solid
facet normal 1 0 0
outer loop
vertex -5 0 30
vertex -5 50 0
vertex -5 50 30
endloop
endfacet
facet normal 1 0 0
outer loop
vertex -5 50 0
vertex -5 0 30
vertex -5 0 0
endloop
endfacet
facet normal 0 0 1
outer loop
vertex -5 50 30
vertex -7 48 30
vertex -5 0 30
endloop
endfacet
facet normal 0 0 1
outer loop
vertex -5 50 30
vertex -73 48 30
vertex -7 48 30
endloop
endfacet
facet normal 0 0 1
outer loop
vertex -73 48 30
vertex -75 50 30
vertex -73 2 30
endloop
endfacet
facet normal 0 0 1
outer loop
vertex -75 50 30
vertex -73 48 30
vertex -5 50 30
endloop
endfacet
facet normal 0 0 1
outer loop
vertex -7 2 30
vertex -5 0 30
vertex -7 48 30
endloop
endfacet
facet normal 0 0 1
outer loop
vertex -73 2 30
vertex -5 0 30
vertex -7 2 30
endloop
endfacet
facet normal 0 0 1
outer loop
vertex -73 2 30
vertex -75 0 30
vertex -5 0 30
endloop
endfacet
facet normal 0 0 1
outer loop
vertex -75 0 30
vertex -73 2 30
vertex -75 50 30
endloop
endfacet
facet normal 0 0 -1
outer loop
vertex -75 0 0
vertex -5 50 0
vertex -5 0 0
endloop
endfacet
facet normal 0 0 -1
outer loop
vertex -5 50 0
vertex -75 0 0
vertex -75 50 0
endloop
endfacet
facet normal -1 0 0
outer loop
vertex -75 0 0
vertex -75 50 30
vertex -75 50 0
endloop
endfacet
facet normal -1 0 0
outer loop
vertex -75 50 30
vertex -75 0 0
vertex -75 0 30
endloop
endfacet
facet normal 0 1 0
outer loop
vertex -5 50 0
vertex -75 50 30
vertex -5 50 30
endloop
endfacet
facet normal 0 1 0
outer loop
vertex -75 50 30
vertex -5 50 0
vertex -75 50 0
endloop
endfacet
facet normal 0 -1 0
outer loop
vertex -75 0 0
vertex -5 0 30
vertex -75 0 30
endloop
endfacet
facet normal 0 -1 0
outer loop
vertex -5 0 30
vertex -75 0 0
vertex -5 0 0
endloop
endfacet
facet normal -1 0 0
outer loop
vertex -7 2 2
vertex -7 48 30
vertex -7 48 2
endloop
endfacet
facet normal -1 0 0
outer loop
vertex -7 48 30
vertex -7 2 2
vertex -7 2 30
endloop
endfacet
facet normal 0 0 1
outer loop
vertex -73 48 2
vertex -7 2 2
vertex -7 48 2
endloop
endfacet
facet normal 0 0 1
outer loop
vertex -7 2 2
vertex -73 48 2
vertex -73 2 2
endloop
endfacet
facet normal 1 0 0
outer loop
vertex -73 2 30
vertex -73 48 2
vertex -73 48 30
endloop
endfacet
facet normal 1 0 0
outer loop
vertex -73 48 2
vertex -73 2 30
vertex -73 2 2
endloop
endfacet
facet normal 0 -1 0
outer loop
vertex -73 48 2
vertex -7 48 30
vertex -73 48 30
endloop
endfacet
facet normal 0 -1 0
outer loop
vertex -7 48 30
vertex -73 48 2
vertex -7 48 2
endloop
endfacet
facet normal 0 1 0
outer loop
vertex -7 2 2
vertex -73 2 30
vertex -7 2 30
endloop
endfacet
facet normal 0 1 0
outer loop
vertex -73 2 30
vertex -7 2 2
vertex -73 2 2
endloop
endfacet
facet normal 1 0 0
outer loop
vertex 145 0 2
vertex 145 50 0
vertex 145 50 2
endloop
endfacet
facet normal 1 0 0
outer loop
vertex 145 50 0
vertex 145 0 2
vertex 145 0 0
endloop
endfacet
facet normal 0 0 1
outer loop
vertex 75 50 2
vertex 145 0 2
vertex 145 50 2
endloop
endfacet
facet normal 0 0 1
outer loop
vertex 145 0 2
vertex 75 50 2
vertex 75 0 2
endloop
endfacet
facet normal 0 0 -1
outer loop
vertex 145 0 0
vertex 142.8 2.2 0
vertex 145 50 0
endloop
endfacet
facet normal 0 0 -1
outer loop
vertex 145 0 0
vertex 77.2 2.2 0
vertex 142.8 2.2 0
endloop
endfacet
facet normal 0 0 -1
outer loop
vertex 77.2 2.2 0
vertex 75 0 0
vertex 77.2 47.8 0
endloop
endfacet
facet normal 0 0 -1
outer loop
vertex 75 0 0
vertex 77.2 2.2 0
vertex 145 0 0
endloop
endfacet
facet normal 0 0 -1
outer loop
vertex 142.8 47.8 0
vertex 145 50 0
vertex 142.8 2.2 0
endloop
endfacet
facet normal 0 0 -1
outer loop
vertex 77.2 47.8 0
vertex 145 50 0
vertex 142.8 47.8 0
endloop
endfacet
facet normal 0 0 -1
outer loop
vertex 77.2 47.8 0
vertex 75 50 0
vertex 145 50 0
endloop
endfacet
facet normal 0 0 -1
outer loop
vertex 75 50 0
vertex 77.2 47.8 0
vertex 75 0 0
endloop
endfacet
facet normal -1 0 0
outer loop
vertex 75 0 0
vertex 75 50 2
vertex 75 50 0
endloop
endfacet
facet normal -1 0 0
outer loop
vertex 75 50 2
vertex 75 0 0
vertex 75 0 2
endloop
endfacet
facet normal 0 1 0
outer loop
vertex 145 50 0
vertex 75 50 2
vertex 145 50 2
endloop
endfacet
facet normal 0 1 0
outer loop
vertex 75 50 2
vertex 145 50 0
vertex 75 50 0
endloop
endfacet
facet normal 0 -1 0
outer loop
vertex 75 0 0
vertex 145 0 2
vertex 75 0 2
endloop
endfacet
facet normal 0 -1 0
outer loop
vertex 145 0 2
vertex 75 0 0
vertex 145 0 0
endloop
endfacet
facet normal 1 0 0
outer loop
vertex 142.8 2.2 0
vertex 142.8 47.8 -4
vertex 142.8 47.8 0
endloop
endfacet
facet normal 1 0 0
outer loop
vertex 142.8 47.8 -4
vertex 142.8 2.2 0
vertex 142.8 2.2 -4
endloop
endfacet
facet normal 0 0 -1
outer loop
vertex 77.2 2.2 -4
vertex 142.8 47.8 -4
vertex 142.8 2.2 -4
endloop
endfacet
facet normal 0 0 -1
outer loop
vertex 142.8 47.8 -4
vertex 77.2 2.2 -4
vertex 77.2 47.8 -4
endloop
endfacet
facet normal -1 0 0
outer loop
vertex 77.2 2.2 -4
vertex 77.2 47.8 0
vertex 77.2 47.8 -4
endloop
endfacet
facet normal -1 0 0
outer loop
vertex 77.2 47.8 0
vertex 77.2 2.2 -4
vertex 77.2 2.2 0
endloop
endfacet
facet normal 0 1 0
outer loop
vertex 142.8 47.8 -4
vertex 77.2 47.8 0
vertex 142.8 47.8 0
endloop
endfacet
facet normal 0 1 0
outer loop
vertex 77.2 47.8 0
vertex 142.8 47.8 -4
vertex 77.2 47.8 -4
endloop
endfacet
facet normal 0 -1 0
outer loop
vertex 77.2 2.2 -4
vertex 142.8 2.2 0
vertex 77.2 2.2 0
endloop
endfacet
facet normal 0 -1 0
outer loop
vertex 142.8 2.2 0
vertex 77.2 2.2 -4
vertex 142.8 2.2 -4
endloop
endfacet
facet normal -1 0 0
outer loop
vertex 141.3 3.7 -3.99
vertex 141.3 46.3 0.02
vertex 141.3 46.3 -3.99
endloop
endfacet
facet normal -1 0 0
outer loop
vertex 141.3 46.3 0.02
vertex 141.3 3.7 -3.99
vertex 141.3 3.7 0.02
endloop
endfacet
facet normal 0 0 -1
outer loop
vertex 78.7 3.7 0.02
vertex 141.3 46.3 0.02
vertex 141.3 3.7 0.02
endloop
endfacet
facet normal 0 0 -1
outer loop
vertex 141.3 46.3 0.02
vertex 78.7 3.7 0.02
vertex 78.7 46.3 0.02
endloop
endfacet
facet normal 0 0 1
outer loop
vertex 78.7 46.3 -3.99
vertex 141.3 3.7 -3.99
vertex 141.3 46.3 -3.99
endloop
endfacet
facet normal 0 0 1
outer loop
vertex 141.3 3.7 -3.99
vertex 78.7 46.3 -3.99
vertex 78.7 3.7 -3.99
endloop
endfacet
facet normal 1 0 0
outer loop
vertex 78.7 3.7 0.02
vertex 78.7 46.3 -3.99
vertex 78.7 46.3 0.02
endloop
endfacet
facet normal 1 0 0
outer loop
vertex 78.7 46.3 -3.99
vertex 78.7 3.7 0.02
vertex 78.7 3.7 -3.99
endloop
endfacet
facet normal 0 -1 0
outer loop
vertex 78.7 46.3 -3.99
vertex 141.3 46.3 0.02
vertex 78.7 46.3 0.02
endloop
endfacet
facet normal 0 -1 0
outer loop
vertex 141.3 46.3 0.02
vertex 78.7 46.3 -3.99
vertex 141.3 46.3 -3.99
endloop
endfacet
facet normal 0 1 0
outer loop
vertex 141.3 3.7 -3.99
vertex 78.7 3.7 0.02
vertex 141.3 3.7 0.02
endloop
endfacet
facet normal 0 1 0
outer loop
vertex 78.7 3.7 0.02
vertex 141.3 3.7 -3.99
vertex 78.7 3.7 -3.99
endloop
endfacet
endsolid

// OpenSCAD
// --- Dimensions ---
// Outer box width (X)
box_w = 70;
// Outer box depth (Y)
box_d = 50;
// Outer box height (Z)
box_h = 30;
// Wall thickness
wall_t = 2;
// Floor thickness
floor_t = 2;
// Lid plate thickness
lid_plate_t = 2;
// Lip wall thickness
lip_t = 1.5;
// Lip height
lip_h = 4;
// Lip outer width
lip_ow = 65.6;
// Lip outer depth
lip_od = 45.6;
// Clearance on each side
clearance = 0.2;
// Gap between parts on bed
gap = 10;

// --- Derived ---
// Inner width/depth of box
box_iw = box_w - 2 * wall_t;
box_id = box_d - 2 * wall_t;

// Lip inner width/depth (matches box inner minus clearance)
lip_iw = lip_ow - 2 * lip_t;
lip_id = lip_od - 2 * lip_t;

// Box center offset (box sits on -X side)
box_cx = -(box_w + gap / 2);
box_cy = 0;

// Lid center offset (lid sits on +X side)
lid_cx = (box_w + gap / 2);
lid_cy = 0;

// --- Part 1: Box ---
// Box sits on XY plane, builds upward
translate([box_cx, box_cy, 0]) {
    // Floor
    union() {
        // Outer shell (box_w x box_d x box_h)
        // minus inner cavity (box_iw x box_id x (box_h - floor_t))
        // plus floor slab
        difference() {
            // Full outer block
            cube([box_w, box_d, box_h], center = false);
            // Inner cavity (starts at floor_t, goes to top)
            translate([wall_t, wall_t, floor_t]) {
                cube([box_iw, box_id, box_h - floor_t + 0.01], center = false);
            }
        }
    }
}

// --- Part 2: Lid (printed upside down, so lip points down) ---
// Lid plate lies on bed (z=0), lip extends downward (-Z)
translate([lid_cx, lid_cy, 0]) {
    difference() {
        // Plate + lip combined
        union() {
            // Plate (70 x 50 x 2)
            cube([box_w, box_d, lid_plate_t], center = false);
            // Lip (extends downward from plate bottom)
            translate([
                (box_w - lip_ow) / 2,
                (box_d - lip_od) / 2,
                -lip_h
            ]) {
                cube([lip_ow, lip_od, lip_h], center = false);
            }
        }
        // Hollow out the lip interior (so it's a wall, not solid)
        translate([
            (box_w - lip_iw) / 2,
            (box_d - lip_id) / 2,
            -lip_h + 0.01
        ]) {
            cube([lip_iw, lip_id, lip_h + 0.01], center = false);
        }
    }
}
